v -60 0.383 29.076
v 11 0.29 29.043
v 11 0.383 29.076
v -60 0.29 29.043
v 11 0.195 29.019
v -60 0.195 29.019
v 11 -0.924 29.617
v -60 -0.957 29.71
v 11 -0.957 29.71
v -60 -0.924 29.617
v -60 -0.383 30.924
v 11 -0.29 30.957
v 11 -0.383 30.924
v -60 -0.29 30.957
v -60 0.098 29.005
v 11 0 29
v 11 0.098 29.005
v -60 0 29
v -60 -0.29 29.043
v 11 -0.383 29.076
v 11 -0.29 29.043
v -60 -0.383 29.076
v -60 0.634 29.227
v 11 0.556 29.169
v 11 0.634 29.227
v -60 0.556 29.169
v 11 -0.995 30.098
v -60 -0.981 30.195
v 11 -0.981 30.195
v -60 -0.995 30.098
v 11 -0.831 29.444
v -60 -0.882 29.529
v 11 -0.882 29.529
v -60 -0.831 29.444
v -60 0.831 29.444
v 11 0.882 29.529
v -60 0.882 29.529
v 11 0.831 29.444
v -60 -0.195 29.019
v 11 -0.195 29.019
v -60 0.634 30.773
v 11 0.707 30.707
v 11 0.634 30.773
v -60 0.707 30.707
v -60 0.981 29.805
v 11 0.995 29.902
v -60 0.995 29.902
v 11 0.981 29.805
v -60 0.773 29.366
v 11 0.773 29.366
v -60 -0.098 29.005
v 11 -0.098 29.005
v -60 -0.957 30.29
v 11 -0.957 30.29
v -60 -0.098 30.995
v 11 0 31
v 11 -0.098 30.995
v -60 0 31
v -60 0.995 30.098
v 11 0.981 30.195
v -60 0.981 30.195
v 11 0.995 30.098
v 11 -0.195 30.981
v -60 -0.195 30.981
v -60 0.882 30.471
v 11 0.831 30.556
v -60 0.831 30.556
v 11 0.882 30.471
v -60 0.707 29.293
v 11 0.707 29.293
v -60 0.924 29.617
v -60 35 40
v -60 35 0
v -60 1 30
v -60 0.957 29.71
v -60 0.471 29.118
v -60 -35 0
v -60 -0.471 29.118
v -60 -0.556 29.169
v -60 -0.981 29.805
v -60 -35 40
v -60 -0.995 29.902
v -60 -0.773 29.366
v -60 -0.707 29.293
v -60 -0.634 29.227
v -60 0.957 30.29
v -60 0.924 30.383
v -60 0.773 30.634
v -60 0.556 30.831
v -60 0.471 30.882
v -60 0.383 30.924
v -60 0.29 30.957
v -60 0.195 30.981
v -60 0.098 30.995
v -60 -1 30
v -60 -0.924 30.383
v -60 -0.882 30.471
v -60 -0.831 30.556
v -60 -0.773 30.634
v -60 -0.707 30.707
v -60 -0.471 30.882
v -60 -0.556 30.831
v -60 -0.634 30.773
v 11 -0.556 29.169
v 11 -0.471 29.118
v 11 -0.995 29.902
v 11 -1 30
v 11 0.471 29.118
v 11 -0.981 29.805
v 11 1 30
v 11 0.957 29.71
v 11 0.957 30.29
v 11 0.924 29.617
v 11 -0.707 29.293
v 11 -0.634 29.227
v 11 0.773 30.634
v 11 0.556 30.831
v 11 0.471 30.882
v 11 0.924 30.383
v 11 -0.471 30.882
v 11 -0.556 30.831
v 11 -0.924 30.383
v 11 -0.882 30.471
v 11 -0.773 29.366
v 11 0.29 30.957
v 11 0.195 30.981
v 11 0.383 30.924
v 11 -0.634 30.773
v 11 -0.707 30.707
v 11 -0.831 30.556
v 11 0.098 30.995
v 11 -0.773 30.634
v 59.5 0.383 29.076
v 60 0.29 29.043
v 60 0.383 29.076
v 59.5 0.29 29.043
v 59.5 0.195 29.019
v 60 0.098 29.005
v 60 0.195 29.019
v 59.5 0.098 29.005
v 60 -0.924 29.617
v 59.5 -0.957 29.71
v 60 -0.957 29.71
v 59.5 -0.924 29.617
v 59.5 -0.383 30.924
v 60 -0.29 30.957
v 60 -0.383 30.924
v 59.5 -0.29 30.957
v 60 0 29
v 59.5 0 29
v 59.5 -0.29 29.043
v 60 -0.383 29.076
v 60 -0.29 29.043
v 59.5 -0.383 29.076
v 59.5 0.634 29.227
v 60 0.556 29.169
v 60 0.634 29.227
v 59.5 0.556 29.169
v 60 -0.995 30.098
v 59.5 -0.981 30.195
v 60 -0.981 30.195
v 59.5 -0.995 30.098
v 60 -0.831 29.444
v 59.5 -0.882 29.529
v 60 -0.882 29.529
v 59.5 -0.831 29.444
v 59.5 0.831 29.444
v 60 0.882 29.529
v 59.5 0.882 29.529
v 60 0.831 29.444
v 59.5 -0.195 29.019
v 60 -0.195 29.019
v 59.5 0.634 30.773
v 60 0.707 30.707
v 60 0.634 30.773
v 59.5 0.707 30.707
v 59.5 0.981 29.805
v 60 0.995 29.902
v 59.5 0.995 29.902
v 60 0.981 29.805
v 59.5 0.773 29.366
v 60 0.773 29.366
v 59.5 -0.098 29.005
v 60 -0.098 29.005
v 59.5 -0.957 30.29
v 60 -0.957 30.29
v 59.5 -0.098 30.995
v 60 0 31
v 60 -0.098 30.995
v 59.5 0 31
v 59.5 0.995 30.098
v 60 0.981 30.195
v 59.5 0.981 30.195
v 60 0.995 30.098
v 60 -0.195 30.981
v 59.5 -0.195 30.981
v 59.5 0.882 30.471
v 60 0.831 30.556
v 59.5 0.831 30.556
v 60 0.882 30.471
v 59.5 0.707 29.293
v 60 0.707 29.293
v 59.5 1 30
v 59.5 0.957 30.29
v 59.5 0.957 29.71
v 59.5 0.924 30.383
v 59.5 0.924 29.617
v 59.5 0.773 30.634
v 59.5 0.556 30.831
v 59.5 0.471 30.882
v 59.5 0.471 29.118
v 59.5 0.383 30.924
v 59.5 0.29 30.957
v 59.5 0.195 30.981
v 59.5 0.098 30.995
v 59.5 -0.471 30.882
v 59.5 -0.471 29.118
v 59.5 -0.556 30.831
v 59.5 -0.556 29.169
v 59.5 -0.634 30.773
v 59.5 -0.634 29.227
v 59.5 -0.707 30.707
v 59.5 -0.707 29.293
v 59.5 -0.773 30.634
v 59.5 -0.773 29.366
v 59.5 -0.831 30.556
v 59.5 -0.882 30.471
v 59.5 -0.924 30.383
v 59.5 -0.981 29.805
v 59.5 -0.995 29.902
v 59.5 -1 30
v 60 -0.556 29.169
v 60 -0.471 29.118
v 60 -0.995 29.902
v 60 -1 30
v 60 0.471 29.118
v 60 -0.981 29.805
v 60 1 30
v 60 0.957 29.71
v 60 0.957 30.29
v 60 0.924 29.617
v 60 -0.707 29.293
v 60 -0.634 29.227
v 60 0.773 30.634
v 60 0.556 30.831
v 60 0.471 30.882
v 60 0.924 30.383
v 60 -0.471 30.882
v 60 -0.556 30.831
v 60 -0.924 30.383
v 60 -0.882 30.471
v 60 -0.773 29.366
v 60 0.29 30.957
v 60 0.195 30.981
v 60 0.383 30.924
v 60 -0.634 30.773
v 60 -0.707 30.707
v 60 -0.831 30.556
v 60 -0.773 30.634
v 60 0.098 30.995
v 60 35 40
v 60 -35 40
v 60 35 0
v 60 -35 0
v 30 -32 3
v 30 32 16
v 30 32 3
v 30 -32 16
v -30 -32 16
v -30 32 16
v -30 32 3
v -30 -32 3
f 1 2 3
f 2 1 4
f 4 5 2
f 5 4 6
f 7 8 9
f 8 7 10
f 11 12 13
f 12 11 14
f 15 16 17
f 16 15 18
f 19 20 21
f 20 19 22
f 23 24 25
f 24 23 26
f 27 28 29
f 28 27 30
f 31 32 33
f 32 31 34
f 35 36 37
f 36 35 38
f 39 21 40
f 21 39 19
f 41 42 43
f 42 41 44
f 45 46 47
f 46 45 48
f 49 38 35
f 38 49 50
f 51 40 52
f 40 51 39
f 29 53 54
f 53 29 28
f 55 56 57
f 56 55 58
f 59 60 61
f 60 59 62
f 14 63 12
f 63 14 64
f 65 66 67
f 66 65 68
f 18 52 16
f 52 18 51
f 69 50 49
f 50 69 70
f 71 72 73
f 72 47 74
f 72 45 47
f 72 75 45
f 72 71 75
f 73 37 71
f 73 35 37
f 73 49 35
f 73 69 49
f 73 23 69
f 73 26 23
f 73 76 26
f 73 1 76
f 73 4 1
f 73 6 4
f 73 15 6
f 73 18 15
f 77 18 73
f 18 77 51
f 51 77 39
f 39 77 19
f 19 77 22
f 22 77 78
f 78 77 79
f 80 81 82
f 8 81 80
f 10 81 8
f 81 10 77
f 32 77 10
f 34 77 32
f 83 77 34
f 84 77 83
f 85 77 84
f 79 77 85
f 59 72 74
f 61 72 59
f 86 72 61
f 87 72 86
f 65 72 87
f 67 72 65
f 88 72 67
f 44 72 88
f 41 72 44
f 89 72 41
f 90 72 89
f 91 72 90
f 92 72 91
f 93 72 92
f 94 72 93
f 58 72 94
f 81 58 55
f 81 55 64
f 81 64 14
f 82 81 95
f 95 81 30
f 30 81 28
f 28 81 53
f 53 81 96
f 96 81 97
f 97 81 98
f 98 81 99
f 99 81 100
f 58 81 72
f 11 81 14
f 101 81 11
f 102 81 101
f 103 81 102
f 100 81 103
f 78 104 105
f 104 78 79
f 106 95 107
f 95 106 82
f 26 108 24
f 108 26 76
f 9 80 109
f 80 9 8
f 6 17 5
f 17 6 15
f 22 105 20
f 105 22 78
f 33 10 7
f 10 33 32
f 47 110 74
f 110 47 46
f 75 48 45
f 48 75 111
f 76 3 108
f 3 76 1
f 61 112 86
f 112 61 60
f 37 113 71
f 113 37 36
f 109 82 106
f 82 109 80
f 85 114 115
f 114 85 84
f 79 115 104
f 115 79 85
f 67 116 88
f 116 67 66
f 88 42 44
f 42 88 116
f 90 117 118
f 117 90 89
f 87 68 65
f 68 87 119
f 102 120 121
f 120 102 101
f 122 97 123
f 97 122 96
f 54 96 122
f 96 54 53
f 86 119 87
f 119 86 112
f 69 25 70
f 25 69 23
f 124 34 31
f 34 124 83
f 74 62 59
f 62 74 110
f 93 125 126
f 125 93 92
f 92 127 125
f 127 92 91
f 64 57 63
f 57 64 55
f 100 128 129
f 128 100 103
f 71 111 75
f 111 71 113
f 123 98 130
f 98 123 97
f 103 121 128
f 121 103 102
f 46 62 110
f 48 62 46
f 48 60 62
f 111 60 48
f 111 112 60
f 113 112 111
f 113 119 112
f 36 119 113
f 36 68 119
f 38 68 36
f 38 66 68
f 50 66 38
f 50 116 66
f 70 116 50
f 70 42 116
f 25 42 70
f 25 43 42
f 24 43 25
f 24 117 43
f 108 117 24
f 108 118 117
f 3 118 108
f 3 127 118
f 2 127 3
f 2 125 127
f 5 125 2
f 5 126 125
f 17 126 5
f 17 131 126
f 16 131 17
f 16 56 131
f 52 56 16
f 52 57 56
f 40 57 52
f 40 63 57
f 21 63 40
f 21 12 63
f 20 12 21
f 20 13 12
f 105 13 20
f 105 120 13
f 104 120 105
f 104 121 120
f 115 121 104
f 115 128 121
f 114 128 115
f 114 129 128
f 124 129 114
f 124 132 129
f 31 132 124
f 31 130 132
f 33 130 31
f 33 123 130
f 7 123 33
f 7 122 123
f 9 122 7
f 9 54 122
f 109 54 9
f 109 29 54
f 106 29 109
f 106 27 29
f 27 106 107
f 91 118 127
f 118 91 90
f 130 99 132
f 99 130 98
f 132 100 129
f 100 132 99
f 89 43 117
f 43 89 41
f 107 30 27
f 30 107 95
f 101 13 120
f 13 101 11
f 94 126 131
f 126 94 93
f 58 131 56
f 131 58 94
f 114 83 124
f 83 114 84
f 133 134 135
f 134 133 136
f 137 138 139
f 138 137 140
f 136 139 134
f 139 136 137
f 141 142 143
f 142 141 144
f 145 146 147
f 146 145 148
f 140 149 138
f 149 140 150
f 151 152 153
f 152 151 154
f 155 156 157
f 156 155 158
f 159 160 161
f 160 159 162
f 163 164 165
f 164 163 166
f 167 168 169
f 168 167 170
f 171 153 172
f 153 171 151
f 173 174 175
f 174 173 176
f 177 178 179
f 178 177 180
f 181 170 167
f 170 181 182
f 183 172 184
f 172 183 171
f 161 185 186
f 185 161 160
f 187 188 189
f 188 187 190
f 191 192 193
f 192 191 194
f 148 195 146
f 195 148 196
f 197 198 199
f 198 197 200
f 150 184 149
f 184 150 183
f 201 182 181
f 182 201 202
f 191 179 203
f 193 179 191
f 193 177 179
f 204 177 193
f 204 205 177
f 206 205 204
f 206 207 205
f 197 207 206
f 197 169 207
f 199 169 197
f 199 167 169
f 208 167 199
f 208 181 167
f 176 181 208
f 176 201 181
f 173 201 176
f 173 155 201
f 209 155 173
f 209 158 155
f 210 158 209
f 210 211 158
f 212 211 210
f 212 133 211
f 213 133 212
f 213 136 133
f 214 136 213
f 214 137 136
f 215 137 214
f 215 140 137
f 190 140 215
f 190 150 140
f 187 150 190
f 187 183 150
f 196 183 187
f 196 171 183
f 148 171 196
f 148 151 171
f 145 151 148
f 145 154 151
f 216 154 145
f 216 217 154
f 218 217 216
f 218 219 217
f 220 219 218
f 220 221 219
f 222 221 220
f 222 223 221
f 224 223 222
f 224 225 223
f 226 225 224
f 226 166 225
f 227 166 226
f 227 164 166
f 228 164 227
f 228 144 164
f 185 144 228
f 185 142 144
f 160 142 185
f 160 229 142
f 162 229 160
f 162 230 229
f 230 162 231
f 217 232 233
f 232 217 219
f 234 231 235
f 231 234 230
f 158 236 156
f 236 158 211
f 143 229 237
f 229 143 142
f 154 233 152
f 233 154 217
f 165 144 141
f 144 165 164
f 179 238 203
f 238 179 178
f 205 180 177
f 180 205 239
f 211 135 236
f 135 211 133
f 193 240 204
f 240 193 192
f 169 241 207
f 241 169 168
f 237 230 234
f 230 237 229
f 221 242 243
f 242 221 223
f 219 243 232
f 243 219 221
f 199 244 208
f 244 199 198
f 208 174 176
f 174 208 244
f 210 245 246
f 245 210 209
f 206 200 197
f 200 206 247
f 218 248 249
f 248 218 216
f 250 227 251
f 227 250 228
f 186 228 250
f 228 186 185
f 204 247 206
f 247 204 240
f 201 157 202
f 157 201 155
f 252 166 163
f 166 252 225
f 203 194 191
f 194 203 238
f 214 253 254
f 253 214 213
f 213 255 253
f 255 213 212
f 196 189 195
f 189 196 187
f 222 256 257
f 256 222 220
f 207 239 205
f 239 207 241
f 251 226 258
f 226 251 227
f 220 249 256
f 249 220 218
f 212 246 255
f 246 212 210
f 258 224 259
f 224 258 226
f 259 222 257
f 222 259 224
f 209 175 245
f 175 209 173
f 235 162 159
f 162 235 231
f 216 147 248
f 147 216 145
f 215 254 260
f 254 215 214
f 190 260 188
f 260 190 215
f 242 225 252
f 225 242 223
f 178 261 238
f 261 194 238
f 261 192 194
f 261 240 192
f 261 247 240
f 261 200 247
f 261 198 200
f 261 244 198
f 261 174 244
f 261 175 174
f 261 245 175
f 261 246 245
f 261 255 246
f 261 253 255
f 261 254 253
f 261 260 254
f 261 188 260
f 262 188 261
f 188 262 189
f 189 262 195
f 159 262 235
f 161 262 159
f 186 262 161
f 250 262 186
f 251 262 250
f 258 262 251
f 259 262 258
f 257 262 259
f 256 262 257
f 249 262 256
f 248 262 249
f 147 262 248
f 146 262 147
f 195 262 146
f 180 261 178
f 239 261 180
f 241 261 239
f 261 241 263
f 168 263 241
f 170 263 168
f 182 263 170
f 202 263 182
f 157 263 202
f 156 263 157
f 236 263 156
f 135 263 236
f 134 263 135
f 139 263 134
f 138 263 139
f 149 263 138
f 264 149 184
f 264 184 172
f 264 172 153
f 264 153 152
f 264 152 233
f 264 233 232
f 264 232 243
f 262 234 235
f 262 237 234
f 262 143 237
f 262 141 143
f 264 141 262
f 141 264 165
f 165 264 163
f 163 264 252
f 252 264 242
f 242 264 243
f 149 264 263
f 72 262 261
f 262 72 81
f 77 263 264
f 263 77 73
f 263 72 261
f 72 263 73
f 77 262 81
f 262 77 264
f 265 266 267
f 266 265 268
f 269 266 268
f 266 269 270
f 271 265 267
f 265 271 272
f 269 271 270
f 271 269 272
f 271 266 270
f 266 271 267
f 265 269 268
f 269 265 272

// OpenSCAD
// Buffer tank for mini horizontal gel-electrophoresis box
// Print orientation: open top facing +Z, resting on XY plane at z = 0

// ---------- Parameters ----------
outer_x   = 120;   // outer length (X)
outer_y   = 70;    // outer width (Y)
outer_z   = 40;    // outer height (Z)
wall      = 3;     // wall thickness
floor     = 3;     // floor thickness

inner_x   = outer_x - 2*wall;   // 114
inner_y   = outer_y - 2*wall;   // 64
inner_z   = outer_z - floor;    // 37  (inner floor at z = floor)

platform_x = 60;    // platform length in X (centred)
platform_top = 13;  // platform top height above inner floor (z = floor + 10)

hole_d     = 2;     // electrode hole diameter
hole_y     = 0;     // hole Y position
hole_z     = 30;    // hole Z position

eps        = 0.5;   // cutter overshoot past faces

$fn = 64;

// ---------- Model ----------
difference() {
    // Tank body (open top)
    translate([-outer_x/2, -outer_y/2, 0])
        cube([outer_x, outer_y, outer_z]);

    // Central raised platform for gel tray
    translate([-platform_x/2, -inner_y/2, floor])
        cube([platform_x, inner_y, platform_top]);

    // Horizontal electrode holes through each end wall (along X)
    for (sx = [-1, 1])
        translate([sx > 0 ? outer_x/2 - eps : -outer_x/2, hole_y, hole_z])
            rotate([0, 90, 0])
                cylinder(d = hole_d, h = outer_y + 2*eps);
}
